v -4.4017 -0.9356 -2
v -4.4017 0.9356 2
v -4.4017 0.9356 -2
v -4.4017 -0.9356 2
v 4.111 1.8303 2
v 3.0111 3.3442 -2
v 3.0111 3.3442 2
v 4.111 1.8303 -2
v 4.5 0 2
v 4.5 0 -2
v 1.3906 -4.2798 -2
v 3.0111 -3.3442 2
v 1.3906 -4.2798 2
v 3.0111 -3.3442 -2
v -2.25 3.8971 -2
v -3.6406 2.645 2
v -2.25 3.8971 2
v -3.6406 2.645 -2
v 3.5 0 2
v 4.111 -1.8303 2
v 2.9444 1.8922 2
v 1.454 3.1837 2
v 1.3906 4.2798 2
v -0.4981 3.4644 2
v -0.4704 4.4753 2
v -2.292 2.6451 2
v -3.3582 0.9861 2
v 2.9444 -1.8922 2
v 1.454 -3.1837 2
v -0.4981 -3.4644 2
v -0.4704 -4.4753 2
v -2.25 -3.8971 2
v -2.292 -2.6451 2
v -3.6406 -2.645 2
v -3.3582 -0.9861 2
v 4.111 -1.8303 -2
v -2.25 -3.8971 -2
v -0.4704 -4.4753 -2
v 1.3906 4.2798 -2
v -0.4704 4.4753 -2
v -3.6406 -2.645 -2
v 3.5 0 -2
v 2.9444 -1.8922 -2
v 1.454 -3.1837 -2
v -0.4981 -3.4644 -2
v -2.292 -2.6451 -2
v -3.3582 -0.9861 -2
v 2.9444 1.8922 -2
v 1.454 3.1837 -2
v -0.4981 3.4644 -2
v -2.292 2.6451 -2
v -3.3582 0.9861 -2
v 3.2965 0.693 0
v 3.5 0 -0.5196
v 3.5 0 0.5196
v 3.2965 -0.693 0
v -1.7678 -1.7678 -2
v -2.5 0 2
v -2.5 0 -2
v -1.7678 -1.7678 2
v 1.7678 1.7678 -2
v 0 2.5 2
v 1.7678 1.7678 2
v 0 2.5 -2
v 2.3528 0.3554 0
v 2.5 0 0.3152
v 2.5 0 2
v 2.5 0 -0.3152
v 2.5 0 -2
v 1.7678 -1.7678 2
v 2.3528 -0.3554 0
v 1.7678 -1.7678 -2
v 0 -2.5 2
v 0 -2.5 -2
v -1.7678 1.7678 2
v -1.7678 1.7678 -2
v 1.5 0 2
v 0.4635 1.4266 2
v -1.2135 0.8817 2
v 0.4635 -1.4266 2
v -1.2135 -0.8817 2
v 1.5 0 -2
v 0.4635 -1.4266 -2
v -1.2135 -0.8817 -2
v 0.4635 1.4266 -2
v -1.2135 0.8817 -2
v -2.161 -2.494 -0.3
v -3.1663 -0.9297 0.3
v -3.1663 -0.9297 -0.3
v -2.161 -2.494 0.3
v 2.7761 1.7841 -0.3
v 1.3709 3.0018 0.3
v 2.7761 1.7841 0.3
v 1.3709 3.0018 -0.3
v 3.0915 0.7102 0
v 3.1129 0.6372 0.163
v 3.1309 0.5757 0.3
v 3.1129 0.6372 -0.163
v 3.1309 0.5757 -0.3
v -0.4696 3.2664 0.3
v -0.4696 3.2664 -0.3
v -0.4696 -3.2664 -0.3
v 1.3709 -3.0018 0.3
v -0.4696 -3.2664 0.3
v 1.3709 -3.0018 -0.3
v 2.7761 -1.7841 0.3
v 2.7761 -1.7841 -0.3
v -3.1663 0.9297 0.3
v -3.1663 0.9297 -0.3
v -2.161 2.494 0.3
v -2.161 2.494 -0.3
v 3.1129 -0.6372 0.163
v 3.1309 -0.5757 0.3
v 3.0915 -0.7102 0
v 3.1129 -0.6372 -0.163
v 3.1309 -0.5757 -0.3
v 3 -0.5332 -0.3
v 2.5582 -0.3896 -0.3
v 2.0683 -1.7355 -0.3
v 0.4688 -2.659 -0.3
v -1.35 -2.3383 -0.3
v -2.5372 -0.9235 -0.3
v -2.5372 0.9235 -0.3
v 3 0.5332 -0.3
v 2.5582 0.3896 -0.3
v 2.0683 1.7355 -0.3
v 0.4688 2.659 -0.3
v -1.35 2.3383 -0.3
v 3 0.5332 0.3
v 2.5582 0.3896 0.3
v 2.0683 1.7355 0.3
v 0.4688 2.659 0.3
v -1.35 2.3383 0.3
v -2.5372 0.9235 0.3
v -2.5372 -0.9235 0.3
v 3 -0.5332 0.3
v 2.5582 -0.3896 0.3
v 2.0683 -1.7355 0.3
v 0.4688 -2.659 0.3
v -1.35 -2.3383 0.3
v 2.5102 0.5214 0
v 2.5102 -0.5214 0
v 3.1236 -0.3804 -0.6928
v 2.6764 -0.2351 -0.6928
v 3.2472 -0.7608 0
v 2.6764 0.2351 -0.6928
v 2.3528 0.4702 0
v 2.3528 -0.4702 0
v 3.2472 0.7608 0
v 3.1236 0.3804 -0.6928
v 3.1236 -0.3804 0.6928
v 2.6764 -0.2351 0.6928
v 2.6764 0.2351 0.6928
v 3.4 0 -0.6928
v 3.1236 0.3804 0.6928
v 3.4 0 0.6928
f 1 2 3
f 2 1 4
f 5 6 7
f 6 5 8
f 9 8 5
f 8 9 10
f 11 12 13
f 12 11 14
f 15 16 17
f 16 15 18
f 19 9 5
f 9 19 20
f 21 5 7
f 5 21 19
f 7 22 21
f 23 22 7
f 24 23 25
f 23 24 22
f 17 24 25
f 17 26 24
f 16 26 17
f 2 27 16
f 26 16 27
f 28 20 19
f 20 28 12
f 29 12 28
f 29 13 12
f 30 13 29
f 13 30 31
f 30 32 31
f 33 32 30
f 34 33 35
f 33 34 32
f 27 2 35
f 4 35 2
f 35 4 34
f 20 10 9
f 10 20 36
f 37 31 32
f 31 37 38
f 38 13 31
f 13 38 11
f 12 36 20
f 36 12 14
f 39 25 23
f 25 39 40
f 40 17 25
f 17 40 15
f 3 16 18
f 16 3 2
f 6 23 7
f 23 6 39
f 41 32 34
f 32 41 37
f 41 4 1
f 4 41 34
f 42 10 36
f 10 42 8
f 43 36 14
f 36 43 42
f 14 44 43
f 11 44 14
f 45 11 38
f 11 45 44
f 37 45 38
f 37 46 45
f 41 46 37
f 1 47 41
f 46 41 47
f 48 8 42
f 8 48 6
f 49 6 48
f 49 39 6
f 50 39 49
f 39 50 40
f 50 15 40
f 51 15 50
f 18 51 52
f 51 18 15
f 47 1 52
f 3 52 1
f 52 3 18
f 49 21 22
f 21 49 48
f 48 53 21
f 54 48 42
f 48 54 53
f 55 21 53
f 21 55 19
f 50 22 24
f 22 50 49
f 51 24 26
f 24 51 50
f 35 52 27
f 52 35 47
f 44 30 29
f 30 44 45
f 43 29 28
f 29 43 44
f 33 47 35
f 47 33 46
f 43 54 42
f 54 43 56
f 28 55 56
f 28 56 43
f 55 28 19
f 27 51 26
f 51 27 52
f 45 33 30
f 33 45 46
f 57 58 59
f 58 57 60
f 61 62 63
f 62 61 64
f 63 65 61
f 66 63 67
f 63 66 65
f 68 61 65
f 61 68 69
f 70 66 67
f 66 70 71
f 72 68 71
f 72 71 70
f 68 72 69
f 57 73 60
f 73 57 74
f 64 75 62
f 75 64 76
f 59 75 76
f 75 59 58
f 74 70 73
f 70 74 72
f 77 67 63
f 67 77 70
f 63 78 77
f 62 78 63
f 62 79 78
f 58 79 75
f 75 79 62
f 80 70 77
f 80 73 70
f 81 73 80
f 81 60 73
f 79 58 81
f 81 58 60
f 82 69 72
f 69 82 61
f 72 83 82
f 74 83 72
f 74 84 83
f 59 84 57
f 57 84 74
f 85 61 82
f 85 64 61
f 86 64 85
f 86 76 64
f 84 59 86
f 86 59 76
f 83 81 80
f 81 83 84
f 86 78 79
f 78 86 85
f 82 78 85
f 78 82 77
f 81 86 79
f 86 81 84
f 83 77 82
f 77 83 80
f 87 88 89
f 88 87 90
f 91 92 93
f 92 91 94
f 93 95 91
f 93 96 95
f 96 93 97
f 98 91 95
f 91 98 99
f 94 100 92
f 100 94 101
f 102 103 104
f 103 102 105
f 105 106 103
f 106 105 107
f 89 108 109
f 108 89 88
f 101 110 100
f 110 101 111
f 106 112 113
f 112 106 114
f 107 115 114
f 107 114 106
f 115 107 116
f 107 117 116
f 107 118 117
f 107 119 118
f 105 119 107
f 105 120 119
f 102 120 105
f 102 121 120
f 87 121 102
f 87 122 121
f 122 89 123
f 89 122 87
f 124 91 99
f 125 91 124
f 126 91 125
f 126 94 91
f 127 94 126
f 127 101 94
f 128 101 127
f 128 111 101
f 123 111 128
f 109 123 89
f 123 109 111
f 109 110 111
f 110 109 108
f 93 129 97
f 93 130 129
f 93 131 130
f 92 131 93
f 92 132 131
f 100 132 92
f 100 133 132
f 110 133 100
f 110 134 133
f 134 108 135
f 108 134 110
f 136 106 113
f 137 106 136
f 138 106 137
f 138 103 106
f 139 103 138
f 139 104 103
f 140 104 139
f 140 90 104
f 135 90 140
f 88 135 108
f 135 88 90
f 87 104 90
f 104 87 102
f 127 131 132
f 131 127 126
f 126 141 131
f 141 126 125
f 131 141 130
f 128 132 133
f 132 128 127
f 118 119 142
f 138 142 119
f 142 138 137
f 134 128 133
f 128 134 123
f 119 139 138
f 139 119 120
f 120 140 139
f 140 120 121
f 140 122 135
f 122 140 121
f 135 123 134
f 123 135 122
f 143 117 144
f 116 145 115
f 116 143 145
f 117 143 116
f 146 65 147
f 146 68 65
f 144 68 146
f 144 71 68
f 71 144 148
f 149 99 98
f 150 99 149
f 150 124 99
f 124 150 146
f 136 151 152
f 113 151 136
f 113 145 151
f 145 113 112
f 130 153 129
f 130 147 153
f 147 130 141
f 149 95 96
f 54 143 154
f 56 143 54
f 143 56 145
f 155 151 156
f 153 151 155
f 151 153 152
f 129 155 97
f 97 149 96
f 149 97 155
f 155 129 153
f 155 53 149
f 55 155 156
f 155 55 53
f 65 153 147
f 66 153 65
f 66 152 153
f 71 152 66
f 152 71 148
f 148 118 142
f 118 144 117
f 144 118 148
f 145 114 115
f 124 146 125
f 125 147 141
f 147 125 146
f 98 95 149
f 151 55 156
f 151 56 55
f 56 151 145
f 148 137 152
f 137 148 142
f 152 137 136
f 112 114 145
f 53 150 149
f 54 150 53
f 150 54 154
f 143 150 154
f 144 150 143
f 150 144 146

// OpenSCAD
// Parameters
bore_diameter_mm = 3.0; //[1.5:6.0:0.1]
outer_diameter_mm = 9.0; //[4.5:18.0:0.1]
width_mm = 4.0; //[2.0:8.0:0.1]
bore_radius_mm = 1.5; //[0.75:3.0:0.05]
outer_radius_mm = 4.5; //[2.25:9.0:0.05]
race_radial_thickness_mm = 1.0; //[0.5:2.0:0.05]
shield_thickness_mm = 0.6; //[0.3:1.2:0.05]
shield_radial_clearance_mm = 0.2; //[0.1:0.6:0.05]
ball_diameter_mm = 1.6; //[0.8:3.2:0.05]
ball_radial_overlap_mm = 0.3; //[0.1:0.8:0.05]
eps_mm = 0.6; //[0.2:1.5:0.05]

// Outer Race
module outer_race() {
  color("Silver") difference() {
    cylinder(r=outer_radius_mm, h=width_mm, center=true);
    cylinder(r=outer_radius_mm - race_radial_thickness_mm, h=width_mm + 2*eps_mm, center=true);
  }
}

// Inner Race
module inner_race() {
  color("Silver") difference() {
    cylinder(r=bore_radius_mm + race_radial_thickness_mm, h=width_mm, center=true);
    cylinder(r=bore_radius_mm, h=width_mm + 2*eps_mm, center=true);
  }
}

// Shield or Seal
module shield_or_seal() {
  color("DimGray") difference() {
    cylinder(r=outer_radius_mm - race_radial_thickness_mm - shield_radial_clearance_mm, h=shield_thickness_mm, center=true);
    cylinder(r=bore_radius_mm + race_radial_thickness_mm + shield_radial_clearance_mm, h=shield_thickness_mm + 2*eps_mm, center=true);
  }
}

// Bearing Ball
module bearing_ball() {
  color("Copper") translate([
    (bore_radius_mm + race_radial_thickness_mm + shield_radial_clearance_mm) + 
    (((outer_radius_mm - race_radial_thickness_mm - shield_radial_clearance_mm) - 
    (bore_radius_mm + race_radial_thickness_mm + shield_radial_clearance_mm)) / 2),
    0, 0
  ]) sphere(r=ball_diameter_mm/2);
}

// Ball Bearing Assembly
module ball_bearing() {
  union() {
    outer_race();
    inner_race();
    shield_or_seal();
    bearing_ball();
  }
}

// Final Assembly
module assembly() {
  ball_bearing();
}

assembly();
